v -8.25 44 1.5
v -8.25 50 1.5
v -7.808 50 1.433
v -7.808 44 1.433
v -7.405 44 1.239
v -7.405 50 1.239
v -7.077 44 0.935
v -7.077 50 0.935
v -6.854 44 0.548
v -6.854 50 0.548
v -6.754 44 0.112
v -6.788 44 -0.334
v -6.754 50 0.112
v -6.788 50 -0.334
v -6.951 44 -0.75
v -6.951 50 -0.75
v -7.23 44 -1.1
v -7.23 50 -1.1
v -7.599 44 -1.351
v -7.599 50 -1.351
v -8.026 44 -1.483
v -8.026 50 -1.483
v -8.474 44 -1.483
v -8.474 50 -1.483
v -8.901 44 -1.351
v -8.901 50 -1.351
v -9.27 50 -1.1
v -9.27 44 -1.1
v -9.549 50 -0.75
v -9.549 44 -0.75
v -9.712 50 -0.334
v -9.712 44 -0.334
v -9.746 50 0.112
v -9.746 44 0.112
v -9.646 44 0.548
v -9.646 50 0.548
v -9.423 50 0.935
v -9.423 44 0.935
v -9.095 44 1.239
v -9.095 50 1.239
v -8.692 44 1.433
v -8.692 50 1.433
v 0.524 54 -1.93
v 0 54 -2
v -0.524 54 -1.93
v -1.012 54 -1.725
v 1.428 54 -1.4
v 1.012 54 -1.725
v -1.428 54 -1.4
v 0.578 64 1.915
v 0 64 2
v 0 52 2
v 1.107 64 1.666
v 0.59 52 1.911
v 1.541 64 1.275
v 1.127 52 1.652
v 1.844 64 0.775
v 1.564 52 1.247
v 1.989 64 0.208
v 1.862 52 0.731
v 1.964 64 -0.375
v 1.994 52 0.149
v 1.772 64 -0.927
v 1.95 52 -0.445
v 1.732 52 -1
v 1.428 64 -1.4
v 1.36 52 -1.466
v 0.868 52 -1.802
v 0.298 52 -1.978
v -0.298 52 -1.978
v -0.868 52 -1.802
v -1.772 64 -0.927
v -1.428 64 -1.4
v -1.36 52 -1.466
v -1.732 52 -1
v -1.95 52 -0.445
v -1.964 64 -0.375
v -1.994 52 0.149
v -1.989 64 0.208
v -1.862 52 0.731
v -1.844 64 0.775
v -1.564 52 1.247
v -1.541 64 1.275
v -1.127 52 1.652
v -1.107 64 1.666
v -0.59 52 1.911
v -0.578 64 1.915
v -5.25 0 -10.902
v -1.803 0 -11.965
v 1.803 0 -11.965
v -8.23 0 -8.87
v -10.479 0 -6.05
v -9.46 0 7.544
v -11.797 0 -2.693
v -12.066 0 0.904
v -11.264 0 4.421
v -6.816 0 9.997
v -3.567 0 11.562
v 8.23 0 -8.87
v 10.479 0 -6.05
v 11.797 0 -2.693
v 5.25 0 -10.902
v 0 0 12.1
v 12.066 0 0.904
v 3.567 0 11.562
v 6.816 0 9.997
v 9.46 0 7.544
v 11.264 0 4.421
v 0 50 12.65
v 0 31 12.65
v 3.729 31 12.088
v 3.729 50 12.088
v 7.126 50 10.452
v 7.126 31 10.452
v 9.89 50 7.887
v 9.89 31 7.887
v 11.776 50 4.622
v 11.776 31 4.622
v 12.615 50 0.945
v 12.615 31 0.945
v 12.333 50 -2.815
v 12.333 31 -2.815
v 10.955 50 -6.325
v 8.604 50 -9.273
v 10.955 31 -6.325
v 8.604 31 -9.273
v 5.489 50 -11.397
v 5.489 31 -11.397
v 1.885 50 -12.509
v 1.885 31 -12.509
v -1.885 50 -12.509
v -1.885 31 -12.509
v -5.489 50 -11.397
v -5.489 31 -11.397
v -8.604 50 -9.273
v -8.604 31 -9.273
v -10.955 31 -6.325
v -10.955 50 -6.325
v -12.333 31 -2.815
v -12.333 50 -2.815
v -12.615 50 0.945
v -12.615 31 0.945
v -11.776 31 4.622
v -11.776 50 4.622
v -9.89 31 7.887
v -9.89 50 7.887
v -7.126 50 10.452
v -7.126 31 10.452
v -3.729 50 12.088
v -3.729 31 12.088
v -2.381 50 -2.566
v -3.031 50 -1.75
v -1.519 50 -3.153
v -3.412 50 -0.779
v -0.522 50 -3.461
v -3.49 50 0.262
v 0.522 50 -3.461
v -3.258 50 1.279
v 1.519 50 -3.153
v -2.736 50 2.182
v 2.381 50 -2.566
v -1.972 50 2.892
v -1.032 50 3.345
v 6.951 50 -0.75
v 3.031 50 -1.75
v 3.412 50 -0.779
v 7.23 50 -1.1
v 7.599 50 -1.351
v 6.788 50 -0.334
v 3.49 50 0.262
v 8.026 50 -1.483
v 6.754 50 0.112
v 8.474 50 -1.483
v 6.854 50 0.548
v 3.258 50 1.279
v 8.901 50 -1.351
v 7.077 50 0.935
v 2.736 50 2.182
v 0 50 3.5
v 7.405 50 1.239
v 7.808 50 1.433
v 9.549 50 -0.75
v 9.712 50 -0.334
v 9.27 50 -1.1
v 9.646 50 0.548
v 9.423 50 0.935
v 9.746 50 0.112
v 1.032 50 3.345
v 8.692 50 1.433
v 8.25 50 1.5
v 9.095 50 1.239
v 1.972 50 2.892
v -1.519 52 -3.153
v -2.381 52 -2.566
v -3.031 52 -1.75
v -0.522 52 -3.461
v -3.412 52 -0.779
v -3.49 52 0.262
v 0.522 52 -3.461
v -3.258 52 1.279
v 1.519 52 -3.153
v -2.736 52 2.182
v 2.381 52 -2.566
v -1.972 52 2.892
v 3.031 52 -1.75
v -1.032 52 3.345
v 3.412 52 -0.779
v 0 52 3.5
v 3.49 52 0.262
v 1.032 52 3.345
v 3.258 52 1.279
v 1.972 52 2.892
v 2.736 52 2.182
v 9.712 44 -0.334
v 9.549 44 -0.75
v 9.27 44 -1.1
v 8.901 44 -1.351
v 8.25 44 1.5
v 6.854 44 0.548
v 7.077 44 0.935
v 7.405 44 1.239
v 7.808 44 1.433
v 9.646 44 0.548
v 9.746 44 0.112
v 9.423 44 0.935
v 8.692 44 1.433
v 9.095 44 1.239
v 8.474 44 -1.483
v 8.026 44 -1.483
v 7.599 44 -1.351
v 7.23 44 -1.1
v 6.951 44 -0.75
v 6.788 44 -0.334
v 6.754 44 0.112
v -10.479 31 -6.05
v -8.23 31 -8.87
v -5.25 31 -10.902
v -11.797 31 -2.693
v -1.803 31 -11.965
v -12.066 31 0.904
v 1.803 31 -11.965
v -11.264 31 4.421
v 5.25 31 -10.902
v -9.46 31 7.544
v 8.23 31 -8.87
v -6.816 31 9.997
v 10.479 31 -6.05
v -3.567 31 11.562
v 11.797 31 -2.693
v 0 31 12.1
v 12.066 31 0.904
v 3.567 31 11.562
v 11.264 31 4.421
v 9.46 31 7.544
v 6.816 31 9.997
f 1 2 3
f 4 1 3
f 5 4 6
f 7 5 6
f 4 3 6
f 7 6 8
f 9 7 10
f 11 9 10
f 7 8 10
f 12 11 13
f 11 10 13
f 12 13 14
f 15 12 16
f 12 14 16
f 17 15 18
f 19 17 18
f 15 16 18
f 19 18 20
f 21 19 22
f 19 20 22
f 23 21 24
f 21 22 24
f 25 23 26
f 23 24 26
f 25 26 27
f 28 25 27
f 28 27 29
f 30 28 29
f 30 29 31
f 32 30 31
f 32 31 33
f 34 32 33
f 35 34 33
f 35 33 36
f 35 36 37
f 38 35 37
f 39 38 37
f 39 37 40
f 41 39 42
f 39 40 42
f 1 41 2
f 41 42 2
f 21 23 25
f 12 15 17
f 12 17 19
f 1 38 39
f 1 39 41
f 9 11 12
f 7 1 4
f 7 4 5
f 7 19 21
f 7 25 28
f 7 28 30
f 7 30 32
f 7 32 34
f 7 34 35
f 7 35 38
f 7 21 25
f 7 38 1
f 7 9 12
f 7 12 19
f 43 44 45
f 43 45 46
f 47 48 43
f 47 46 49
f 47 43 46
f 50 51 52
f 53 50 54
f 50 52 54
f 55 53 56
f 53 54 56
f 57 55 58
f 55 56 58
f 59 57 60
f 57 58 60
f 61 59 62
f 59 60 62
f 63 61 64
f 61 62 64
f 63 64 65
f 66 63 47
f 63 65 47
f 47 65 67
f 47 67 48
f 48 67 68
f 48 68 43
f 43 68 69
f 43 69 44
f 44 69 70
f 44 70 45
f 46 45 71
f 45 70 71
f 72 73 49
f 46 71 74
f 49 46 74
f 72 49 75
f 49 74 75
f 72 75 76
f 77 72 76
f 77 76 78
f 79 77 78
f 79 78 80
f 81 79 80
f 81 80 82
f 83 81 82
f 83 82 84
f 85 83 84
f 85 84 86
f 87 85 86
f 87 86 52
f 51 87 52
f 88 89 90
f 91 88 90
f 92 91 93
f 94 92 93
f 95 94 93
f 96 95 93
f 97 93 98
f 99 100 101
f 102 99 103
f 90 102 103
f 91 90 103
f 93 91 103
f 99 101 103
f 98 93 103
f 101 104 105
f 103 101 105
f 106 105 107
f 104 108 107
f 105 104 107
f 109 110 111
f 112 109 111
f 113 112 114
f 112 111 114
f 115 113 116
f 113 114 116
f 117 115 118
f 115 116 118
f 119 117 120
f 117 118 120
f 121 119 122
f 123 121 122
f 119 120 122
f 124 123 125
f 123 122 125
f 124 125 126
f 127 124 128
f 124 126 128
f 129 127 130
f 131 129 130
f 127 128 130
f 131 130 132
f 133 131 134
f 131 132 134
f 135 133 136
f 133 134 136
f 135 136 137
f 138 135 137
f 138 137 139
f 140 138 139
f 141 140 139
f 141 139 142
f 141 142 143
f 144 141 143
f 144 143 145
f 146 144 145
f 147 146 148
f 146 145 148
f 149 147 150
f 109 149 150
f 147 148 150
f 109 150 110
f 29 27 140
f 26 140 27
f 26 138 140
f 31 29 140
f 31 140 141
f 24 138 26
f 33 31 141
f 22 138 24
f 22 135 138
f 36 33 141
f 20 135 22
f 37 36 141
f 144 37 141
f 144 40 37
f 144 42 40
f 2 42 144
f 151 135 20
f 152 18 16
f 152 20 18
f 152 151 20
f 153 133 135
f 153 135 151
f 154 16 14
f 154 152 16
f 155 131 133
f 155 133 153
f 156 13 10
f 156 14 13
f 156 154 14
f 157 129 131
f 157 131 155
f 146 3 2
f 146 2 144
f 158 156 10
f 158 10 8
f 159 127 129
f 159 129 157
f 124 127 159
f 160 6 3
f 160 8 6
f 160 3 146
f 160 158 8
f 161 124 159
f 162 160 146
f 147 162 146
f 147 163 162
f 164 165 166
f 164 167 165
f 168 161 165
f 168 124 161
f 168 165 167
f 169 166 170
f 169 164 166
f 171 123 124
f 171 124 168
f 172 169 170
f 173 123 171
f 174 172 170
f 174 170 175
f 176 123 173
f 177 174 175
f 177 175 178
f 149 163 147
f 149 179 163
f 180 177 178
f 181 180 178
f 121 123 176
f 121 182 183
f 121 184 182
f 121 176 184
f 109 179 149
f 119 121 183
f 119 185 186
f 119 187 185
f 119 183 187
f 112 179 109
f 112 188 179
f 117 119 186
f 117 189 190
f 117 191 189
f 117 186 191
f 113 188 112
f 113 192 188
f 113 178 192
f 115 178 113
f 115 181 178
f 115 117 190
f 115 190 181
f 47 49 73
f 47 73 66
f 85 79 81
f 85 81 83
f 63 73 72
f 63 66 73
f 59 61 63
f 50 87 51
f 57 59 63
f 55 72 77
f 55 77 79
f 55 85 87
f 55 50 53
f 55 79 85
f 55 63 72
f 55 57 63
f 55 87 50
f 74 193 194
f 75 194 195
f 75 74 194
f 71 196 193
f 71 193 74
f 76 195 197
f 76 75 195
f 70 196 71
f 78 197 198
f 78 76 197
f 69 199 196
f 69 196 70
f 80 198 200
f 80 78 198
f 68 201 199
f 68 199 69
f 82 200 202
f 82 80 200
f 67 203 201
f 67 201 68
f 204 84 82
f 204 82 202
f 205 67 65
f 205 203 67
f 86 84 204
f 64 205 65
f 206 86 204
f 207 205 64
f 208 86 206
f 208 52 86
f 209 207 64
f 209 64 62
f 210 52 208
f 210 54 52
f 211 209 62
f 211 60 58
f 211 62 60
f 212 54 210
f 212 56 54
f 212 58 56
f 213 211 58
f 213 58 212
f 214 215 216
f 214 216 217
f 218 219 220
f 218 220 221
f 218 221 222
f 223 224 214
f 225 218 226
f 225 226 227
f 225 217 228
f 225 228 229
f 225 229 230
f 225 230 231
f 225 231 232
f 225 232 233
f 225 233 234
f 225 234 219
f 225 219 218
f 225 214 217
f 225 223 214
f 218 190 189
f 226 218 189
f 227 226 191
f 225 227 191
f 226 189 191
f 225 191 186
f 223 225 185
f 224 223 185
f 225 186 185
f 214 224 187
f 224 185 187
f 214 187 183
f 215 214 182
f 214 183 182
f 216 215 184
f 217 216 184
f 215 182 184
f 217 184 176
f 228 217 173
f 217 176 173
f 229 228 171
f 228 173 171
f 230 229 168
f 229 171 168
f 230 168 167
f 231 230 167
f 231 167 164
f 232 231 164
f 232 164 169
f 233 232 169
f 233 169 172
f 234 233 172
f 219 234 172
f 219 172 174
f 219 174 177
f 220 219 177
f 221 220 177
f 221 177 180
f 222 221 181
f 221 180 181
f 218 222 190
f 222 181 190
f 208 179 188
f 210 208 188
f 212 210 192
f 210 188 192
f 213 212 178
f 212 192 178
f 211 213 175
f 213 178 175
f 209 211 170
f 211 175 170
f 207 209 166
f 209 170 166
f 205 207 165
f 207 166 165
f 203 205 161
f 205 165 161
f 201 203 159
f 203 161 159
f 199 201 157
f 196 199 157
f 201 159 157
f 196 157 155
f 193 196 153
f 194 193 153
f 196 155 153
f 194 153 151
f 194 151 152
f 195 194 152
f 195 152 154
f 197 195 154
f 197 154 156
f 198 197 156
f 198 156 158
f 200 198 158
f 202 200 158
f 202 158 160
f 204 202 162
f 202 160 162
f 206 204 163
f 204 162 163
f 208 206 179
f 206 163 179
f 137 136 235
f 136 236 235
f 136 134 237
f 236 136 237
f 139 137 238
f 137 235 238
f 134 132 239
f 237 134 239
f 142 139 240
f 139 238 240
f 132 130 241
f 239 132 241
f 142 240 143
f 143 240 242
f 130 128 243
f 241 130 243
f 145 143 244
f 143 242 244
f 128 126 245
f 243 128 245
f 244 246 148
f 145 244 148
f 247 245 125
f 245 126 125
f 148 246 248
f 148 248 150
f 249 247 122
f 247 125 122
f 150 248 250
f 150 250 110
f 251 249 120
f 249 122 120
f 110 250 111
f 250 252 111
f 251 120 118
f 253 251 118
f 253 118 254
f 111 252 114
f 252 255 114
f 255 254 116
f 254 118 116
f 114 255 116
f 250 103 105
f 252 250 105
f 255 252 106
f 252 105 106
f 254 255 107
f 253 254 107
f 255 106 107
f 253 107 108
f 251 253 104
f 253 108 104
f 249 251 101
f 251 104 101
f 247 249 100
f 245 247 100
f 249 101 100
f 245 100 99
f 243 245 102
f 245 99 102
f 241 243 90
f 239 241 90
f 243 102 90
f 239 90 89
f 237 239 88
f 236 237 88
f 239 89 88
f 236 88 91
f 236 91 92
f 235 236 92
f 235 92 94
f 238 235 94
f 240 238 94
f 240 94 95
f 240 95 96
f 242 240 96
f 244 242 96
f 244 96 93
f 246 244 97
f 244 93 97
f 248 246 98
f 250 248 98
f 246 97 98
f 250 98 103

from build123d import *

# Parameters (mm, degrees)
SKETCH1_R           = 12.1
BOSS_EXTRUDE1_DEPTH = 31
SKETCH2_R           = 12.65
BOSS_EXTRUDE2_DEPTH = 19
SKETCH3_R           = 3.5
BOSS_EXTRUDE3_DEPTH = 2
SKETCH4_R           = 2
BOSS_EXTRUDE4_DEPTH = 12
SKETCH5_R           = 1.5
CUT_EXTRUDE1_DEPTH  = 6
CUT_EXTRUDE2_START  = -10
CUT_EXTRUDE2_DEPTH  = 10


with BuildPart() as part:
    # Sketch1 → Boss-Extrude1 (new body)
    with BuildSketch(Plane(origin=(0, 0, 0), x_dir=(1, 0, 0), z_dir=(0, 1, 0))):
        with Locations(Location((0, 0, 0), (0, 0, 270))):
            Circle(SKETCH1_R)
    extrude(amount=BOSS_EXTRUDE1_DEPTH)

    # Sketch2 → Boss-Extrude2 (add)
    with BuildSketch(Plane(origin=(0, 31, 0), x_dir=(1, 0, 0), z_dir=(0, 1, 0))):
        with Locations(Location((0, 0, 0), (0, 0, 270))):
            Circle(SKETCH2_R)
    extrude(amount=BOSS_EXTRUDE2_DEPTH)

    # Sketch3 → Boss-Extrude3 (add)
    with BuildSketch(Plane(origin=(0, 50, 0), x_dir=(1, 0, 0), z_dir=(0, 1, 0))):
        with Locations(Location((0, 0, 0), (0, 0, 270))):
            Circle(SKETCH3_R)
    extrude(amount=BOSS_EXTRUDE3_DEPTH)

    # Sketch4 → Boss-Extrude4 (add)
    with BuildSketch(Plane(origin=(0, 52, 0), x_dir=(1, 0, 0), z_dir=(0, 1, 0))):
        with Locations(Location((0, 0, 0), (0, 0, 270))):
            Circle(SKETCH4_R)
    extrude(amount=BOSS_EXTRUDE4_DEPTH)

    # Sketch5 → Cut-Extrude1 (cut)
    with BuildSketch(Plane(origin=(0, 50, 0), x_dir=(1, 0, 0), z_dir=(0, 1, 0))):
        with Locations(Location((8.25, 0, 0), (0, 0, 270))):
            Circle(SKETCH5_R)
        with Locations(Location((-8.25, 0, 0), (0, 0, 270))):
            Circle(SKETCH5_R)
    extrude(amount=-CUT_EXTRUDE1_DEPTH, mode=Mode.SUBTRACT)

    # Sketch6 → Cut-Extrude2 (cut)
    with BuildSketch(Plane(origin=(0, 64, 0), x_dir=(1, 0, 0), z_dir=(0, 1, 0)).offset(CUT_EXTRUDE2_START)):
        with BuildLine():
            Line((-1.428285686, 1.4), (1.428285686, 1.4))
            ThreePointArc((1.428285686, 1.4), (0, 2), (-1.428285686, 1.4))
        make_face()
    extrude(amount=CUT_EXTRUDE2_DEPTH, mode=Mode.SUBTRACT)


solid = part.part
